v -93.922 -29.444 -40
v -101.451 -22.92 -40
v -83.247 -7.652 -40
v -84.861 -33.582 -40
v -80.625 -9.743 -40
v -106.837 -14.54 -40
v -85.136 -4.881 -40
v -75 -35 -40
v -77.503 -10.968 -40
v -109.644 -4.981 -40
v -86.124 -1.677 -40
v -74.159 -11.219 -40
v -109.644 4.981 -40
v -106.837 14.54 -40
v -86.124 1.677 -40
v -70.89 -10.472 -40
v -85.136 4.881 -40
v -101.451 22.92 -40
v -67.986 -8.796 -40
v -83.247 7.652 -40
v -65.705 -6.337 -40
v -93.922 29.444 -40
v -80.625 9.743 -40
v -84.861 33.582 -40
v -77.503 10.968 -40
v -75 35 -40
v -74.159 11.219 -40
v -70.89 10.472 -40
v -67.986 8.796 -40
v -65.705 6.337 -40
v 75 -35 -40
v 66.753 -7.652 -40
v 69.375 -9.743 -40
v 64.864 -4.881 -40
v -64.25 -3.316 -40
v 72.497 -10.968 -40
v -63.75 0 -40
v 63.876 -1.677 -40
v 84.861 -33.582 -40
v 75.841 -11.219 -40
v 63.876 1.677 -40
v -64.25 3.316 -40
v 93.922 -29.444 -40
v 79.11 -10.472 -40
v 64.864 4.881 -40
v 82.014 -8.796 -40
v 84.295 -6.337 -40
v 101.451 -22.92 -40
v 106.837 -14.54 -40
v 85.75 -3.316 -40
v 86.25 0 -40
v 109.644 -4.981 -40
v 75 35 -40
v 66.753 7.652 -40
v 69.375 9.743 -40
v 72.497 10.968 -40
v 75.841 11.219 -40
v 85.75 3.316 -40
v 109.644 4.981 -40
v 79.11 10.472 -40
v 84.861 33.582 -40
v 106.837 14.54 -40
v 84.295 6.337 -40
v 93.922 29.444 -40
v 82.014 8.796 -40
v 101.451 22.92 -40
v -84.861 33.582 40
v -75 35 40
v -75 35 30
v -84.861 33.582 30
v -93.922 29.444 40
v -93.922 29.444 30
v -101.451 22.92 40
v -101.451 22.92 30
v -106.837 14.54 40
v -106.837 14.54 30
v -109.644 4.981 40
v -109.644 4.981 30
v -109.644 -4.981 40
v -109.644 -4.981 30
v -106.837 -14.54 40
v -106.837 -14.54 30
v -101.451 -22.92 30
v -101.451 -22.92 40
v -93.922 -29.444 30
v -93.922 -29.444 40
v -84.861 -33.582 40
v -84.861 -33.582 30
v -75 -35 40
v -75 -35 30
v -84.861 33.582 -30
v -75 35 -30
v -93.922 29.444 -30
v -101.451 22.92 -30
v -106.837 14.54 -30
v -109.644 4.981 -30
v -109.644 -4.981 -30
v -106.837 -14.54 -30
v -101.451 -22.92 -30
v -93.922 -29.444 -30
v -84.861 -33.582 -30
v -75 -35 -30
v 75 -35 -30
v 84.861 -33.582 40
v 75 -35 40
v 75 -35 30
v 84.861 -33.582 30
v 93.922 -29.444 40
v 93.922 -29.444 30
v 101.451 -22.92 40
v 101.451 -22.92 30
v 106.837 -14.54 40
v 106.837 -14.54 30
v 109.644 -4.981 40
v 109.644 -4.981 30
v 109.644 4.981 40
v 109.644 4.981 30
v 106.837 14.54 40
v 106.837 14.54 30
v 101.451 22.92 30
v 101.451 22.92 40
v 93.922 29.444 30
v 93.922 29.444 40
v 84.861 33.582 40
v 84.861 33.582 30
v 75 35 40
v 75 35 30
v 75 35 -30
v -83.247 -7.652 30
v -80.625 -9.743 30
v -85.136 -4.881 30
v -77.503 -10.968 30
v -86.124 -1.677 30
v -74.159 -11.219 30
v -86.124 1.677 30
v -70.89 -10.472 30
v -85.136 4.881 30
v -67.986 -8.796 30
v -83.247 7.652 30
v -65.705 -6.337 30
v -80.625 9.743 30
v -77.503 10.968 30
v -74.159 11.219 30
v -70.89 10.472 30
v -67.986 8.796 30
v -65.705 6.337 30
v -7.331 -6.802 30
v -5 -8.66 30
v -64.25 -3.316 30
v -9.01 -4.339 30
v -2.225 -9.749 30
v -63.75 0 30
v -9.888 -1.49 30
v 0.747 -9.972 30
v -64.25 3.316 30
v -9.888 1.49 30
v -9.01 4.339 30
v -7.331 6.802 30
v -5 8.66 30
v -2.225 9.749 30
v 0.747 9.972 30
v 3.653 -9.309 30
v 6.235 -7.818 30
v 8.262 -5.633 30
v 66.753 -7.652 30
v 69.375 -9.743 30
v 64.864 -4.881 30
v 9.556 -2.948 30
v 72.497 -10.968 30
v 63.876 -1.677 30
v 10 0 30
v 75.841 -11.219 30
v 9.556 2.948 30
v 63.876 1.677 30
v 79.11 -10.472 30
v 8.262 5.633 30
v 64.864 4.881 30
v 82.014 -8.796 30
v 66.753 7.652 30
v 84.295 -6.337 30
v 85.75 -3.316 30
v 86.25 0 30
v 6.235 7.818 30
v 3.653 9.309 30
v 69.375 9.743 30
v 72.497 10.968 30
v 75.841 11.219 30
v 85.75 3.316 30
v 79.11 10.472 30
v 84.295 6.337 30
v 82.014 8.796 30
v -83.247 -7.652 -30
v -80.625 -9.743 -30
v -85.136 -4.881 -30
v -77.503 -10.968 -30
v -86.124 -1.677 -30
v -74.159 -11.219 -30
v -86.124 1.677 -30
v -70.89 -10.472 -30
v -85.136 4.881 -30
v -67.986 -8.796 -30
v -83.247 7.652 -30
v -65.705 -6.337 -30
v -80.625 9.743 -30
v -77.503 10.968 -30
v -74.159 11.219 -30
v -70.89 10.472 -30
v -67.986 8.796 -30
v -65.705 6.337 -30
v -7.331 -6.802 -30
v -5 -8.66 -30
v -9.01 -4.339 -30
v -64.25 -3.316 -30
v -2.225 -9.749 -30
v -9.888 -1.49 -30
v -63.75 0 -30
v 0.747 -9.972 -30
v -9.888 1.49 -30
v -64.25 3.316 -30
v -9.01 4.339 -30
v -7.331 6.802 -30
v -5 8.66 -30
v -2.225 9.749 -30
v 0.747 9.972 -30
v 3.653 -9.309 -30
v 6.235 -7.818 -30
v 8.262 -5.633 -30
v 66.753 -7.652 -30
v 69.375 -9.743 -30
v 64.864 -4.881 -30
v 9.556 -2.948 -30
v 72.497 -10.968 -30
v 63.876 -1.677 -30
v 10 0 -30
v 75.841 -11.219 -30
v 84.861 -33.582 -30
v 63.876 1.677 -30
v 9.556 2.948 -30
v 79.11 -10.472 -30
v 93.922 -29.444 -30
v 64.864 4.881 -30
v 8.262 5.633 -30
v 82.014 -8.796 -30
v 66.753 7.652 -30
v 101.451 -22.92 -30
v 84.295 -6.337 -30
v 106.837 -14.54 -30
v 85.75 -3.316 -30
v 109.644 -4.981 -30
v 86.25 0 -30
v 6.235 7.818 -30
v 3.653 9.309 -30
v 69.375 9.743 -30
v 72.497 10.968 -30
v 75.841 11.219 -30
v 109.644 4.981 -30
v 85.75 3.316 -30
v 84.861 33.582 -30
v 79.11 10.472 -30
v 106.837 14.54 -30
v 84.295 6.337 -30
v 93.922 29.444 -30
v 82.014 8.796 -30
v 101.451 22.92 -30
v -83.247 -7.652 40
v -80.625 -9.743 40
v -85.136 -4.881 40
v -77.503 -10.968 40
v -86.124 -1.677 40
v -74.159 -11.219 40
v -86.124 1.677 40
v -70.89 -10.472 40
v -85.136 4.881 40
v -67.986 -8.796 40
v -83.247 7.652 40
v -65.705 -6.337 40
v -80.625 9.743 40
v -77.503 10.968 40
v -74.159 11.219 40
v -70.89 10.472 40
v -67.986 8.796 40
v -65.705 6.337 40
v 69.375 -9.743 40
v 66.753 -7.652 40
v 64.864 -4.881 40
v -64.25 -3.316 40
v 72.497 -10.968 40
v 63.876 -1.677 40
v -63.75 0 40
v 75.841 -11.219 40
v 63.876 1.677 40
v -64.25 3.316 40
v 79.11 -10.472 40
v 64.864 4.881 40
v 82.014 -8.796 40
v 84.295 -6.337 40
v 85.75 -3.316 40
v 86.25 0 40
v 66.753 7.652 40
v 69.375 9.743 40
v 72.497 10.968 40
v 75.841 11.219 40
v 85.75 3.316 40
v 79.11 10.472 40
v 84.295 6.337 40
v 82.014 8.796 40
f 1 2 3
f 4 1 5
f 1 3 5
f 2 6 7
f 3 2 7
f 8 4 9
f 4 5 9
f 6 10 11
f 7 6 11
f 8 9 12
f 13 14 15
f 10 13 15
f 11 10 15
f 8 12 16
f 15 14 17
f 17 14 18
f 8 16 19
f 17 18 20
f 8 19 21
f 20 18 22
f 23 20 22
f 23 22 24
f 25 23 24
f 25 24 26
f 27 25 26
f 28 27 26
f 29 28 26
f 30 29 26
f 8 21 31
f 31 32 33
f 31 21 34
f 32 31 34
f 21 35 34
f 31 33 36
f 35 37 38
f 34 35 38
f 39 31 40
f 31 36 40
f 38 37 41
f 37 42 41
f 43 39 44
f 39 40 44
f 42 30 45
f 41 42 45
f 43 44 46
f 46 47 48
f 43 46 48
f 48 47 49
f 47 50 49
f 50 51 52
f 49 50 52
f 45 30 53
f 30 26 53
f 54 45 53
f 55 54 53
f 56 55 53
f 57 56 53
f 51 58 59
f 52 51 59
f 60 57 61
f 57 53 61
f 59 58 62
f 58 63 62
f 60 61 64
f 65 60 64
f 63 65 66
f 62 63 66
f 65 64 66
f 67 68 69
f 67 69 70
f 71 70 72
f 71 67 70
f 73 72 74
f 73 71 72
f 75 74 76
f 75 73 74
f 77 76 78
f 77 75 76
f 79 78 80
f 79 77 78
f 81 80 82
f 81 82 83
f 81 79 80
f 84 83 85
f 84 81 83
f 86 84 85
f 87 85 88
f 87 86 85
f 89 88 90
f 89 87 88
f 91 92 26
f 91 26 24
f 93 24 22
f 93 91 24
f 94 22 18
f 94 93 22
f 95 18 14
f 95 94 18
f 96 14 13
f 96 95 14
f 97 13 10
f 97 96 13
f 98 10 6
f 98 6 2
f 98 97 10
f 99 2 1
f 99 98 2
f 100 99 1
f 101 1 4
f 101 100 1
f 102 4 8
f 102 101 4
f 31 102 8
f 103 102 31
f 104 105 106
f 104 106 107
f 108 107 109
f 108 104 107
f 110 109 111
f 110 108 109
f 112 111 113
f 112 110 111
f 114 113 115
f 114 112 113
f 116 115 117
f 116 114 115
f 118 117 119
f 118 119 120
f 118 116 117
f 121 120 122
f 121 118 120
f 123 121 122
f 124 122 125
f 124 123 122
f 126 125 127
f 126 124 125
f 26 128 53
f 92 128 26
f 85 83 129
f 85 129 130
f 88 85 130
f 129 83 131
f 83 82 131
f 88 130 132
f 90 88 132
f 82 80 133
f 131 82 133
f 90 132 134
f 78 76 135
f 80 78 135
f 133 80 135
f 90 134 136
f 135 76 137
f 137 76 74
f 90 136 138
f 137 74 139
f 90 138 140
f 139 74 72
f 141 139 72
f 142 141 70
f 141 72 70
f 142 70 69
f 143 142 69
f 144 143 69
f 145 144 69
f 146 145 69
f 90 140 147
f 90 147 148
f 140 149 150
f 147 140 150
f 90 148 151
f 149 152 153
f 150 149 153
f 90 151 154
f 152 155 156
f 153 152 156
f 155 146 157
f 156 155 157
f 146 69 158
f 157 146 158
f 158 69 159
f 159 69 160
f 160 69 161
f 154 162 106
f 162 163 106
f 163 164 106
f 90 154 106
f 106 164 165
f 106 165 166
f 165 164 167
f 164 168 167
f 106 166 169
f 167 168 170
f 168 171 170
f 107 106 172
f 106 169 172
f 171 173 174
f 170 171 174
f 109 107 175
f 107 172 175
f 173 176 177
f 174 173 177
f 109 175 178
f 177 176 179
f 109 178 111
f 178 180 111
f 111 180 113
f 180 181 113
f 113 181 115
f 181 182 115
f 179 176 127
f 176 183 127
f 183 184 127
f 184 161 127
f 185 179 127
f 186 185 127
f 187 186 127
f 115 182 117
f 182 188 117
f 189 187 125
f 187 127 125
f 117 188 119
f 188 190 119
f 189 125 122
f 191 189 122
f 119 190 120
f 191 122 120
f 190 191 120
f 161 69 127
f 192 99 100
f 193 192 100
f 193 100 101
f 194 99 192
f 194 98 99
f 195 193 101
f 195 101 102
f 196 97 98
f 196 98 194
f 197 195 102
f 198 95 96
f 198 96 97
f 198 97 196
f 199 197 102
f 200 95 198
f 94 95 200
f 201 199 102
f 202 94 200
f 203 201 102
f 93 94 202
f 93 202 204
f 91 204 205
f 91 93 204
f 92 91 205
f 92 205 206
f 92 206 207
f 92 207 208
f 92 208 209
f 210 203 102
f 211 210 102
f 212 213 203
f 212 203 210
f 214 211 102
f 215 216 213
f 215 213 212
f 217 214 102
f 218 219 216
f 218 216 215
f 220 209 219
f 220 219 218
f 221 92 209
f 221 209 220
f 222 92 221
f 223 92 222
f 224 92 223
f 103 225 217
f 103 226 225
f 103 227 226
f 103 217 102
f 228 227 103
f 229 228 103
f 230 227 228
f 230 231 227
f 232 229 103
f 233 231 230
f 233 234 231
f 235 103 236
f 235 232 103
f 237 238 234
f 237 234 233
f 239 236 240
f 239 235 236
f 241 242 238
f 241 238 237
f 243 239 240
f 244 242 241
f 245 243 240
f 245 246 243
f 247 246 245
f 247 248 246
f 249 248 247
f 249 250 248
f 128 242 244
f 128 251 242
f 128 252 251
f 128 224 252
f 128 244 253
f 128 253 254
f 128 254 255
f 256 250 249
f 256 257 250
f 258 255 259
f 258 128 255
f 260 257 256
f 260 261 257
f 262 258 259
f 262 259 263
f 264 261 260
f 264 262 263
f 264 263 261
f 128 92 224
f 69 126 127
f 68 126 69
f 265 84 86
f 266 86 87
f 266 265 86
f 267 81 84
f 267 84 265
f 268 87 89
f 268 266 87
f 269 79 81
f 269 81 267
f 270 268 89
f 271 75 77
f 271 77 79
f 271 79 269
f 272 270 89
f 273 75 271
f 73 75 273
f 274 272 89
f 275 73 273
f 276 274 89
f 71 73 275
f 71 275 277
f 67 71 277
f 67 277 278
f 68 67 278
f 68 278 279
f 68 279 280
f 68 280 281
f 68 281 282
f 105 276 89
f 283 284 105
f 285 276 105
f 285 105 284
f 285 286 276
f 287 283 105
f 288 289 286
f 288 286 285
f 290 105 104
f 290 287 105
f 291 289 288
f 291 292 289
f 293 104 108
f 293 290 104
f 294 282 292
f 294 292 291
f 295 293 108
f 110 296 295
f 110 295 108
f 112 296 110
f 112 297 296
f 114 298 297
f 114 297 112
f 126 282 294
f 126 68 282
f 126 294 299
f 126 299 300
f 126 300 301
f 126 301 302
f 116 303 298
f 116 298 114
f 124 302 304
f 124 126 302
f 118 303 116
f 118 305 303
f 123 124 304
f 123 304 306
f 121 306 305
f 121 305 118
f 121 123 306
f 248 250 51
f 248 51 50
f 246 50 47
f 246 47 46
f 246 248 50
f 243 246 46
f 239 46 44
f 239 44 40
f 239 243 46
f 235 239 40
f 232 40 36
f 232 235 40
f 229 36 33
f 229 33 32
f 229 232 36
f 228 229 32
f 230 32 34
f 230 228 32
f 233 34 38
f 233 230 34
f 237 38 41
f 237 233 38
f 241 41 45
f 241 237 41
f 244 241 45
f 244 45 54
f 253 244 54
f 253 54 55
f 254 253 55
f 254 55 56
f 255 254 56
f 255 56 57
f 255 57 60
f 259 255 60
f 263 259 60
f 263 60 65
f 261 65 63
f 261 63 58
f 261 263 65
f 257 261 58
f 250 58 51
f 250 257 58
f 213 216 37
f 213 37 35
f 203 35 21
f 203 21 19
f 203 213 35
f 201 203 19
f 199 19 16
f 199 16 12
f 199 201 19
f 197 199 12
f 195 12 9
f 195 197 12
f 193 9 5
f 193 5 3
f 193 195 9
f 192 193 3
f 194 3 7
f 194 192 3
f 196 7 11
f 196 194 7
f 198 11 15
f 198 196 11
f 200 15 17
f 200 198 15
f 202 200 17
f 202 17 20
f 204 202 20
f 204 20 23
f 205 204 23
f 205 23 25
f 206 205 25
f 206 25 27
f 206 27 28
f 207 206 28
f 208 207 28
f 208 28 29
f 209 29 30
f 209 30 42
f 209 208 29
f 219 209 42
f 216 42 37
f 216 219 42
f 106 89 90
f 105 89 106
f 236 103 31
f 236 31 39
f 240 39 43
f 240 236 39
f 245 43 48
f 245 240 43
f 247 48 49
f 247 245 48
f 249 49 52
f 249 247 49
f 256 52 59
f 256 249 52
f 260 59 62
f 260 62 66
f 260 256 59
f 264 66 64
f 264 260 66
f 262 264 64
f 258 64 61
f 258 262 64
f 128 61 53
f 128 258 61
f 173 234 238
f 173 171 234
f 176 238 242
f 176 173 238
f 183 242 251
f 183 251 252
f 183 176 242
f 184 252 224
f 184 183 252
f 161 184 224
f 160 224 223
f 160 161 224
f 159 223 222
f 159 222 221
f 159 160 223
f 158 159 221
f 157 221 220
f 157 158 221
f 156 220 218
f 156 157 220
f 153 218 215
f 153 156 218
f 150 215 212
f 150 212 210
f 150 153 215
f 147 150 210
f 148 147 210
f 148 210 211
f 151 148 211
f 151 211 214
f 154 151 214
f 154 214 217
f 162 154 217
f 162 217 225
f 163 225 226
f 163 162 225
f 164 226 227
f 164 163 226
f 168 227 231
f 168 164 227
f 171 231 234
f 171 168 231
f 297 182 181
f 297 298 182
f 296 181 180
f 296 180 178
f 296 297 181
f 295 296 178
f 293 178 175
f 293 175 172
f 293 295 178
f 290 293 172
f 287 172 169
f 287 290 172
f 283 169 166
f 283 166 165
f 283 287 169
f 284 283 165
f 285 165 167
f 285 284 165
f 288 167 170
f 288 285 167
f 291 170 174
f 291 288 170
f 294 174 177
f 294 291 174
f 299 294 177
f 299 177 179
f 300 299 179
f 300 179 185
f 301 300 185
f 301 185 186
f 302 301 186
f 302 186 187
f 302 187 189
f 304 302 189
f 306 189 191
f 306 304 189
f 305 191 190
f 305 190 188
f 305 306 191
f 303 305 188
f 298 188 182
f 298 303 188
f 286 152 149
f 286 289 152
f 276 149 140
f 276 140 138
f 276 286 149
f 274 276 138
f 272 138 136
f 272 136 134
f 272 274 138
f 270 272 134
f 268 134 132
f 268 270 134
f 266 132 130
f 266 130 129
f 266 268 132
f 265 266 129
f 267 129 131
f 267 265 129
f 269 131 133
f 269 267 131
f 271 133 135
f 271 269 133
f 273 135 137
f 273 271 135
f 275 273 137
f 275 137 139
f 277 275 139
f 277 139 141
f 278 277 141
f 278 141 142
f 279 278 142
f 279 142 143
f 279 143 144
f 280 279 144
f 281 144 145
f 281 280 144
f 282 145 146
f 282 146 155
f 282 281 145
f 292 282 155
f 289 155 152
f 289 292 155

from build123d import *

# Parameters (mm, degrees)
F0_R     = 10
F1_DEPTH = 40
F2_DEPTH = 30


with BuildPart() as f1:
    # F0 (on Top) → F1 (new body, symmetric)
    with BuildSketch(Plane.XY):
        with BuildLine():
            Line((75, 35), (-75, 35))
            ThreePointArc((-75, 35), (-110, 0), (-75, -35))
            Line((-75, -35), (75, -35))
            ThreePointArc((75, -35), (110, 0), (75, 35))
        make_face()
        with BuildLine():
            ThreePointArc((-42.5, 0), (-75, -32.5), (-107.5, 0))
            Line((-107.5, 0), (-86.25, 0))
            ThreePointArc((-86.25, 0), (-75, 11.25), (-63.75, 0))
            Line((-63.75, 0), (-42.5, 0))
        make_face(mode=Mode.SUBTRACT)
        with BuildLine():
            ThreePointArc((107.5, 0), (75, -32.5), (42.5, 0))
            Line((42.5, 0), (63.75, 0))
            ThreePointArc((63.75, 0), (75, 11.25), (86.25, 0))
            Line((86.25, 0), (107.5, 0))
        make_face(mode=Mode.SUBTRACT)
        Circle(F0_R, mode=Mode.SUBTRACT)
        with BuildLine():
            Line((-86.25, 0), (-107.5, 0))
            ThreePointArc((-107.5, 0), (-75, -32.5), (-42.5, 0))
            Line((-42.5, 0), (-63.75, 0))
            ThreePointArc((-63.75, 0), (-75, -11.25), (-86.25, 0))
        make_face()
        with BuildLine():
            Line((63.75, 0), (42.5, 0))
            ThreePointArc((42.5, 0), (75, -32.5), (107.5, 0))
            Line((107.5, 0), (86.25, 0))
            ThreePointArc((86.25, 0), (75, -11.25), (63.75, 0))
        make_face()
        Circle(F0_R)
    extrude(amount=F1_DEPTH, both=True)

    # F0 (on Top) → F2 (cut, symmetric)
    with BuildSketch(Plane.XY):
        with BuildLine():
            Line((75, 35), (-75, 35))
            ThreePointArc((-75, 35), (-110, 0), (-75, -35))
            Line((-75, -35), (75, -35))
            ThreePointArc((75, -35), (110, 0), (75, 35))
        make_face()
        with BuildLine():
            ThreePointArc((-42.5, 0), (-75, -32.5), (-107.5, 0))
            Line((-107.5, 0), (-86.25, 0))
            ThreePointArc((-86.25, 0), (-75, 11.25), (-63.75, 0))
            Line((-63.75, 0), (-42.5, 0))
        make_face(mode=Mode.SUBTRACT)
        with BuildLine():
            ThreePointArc((107.5, 0), (75, -32.5), (42.5, 0))
            Line((42.5, 0), (63.75, 0))
            ThreePointArc((63.75, 0), (75, 11.25), (86.25, 0))
            Line((86.25, 0), (107.5, 0))
        make_face(mode=Mode.SUBTRACT)
        Circle(F0_R, mode=Mode.SUBTRACT)
        with BuildLine():
            Line((-86.25, 0), (-107.5, 0))
            ThreePointArc((-107.5, 0), (-75, -32.5), (-42.5, 0))
            Line((-42.5, 0), (-63.75, 0))
            ThreePointArc((-63.75, 0), (-75, -11.25), (-86.25, 0))
        make_face()
        with BuildLine():
            Line((63.75, 0), (42.5, 0))
            ThreePointArc((42.5, 0), (75, -32.5), (107.5, 0))
            Line((107.5, 0), (86.25, 0))
            ThreePointArc((86.25, 0), (75, -11.25), (63.75, 0))
        make_face()
    extrude(amount=F2_DEPTH, both=True, mode=Mode.SUBTRACT)


solid = f1.part
